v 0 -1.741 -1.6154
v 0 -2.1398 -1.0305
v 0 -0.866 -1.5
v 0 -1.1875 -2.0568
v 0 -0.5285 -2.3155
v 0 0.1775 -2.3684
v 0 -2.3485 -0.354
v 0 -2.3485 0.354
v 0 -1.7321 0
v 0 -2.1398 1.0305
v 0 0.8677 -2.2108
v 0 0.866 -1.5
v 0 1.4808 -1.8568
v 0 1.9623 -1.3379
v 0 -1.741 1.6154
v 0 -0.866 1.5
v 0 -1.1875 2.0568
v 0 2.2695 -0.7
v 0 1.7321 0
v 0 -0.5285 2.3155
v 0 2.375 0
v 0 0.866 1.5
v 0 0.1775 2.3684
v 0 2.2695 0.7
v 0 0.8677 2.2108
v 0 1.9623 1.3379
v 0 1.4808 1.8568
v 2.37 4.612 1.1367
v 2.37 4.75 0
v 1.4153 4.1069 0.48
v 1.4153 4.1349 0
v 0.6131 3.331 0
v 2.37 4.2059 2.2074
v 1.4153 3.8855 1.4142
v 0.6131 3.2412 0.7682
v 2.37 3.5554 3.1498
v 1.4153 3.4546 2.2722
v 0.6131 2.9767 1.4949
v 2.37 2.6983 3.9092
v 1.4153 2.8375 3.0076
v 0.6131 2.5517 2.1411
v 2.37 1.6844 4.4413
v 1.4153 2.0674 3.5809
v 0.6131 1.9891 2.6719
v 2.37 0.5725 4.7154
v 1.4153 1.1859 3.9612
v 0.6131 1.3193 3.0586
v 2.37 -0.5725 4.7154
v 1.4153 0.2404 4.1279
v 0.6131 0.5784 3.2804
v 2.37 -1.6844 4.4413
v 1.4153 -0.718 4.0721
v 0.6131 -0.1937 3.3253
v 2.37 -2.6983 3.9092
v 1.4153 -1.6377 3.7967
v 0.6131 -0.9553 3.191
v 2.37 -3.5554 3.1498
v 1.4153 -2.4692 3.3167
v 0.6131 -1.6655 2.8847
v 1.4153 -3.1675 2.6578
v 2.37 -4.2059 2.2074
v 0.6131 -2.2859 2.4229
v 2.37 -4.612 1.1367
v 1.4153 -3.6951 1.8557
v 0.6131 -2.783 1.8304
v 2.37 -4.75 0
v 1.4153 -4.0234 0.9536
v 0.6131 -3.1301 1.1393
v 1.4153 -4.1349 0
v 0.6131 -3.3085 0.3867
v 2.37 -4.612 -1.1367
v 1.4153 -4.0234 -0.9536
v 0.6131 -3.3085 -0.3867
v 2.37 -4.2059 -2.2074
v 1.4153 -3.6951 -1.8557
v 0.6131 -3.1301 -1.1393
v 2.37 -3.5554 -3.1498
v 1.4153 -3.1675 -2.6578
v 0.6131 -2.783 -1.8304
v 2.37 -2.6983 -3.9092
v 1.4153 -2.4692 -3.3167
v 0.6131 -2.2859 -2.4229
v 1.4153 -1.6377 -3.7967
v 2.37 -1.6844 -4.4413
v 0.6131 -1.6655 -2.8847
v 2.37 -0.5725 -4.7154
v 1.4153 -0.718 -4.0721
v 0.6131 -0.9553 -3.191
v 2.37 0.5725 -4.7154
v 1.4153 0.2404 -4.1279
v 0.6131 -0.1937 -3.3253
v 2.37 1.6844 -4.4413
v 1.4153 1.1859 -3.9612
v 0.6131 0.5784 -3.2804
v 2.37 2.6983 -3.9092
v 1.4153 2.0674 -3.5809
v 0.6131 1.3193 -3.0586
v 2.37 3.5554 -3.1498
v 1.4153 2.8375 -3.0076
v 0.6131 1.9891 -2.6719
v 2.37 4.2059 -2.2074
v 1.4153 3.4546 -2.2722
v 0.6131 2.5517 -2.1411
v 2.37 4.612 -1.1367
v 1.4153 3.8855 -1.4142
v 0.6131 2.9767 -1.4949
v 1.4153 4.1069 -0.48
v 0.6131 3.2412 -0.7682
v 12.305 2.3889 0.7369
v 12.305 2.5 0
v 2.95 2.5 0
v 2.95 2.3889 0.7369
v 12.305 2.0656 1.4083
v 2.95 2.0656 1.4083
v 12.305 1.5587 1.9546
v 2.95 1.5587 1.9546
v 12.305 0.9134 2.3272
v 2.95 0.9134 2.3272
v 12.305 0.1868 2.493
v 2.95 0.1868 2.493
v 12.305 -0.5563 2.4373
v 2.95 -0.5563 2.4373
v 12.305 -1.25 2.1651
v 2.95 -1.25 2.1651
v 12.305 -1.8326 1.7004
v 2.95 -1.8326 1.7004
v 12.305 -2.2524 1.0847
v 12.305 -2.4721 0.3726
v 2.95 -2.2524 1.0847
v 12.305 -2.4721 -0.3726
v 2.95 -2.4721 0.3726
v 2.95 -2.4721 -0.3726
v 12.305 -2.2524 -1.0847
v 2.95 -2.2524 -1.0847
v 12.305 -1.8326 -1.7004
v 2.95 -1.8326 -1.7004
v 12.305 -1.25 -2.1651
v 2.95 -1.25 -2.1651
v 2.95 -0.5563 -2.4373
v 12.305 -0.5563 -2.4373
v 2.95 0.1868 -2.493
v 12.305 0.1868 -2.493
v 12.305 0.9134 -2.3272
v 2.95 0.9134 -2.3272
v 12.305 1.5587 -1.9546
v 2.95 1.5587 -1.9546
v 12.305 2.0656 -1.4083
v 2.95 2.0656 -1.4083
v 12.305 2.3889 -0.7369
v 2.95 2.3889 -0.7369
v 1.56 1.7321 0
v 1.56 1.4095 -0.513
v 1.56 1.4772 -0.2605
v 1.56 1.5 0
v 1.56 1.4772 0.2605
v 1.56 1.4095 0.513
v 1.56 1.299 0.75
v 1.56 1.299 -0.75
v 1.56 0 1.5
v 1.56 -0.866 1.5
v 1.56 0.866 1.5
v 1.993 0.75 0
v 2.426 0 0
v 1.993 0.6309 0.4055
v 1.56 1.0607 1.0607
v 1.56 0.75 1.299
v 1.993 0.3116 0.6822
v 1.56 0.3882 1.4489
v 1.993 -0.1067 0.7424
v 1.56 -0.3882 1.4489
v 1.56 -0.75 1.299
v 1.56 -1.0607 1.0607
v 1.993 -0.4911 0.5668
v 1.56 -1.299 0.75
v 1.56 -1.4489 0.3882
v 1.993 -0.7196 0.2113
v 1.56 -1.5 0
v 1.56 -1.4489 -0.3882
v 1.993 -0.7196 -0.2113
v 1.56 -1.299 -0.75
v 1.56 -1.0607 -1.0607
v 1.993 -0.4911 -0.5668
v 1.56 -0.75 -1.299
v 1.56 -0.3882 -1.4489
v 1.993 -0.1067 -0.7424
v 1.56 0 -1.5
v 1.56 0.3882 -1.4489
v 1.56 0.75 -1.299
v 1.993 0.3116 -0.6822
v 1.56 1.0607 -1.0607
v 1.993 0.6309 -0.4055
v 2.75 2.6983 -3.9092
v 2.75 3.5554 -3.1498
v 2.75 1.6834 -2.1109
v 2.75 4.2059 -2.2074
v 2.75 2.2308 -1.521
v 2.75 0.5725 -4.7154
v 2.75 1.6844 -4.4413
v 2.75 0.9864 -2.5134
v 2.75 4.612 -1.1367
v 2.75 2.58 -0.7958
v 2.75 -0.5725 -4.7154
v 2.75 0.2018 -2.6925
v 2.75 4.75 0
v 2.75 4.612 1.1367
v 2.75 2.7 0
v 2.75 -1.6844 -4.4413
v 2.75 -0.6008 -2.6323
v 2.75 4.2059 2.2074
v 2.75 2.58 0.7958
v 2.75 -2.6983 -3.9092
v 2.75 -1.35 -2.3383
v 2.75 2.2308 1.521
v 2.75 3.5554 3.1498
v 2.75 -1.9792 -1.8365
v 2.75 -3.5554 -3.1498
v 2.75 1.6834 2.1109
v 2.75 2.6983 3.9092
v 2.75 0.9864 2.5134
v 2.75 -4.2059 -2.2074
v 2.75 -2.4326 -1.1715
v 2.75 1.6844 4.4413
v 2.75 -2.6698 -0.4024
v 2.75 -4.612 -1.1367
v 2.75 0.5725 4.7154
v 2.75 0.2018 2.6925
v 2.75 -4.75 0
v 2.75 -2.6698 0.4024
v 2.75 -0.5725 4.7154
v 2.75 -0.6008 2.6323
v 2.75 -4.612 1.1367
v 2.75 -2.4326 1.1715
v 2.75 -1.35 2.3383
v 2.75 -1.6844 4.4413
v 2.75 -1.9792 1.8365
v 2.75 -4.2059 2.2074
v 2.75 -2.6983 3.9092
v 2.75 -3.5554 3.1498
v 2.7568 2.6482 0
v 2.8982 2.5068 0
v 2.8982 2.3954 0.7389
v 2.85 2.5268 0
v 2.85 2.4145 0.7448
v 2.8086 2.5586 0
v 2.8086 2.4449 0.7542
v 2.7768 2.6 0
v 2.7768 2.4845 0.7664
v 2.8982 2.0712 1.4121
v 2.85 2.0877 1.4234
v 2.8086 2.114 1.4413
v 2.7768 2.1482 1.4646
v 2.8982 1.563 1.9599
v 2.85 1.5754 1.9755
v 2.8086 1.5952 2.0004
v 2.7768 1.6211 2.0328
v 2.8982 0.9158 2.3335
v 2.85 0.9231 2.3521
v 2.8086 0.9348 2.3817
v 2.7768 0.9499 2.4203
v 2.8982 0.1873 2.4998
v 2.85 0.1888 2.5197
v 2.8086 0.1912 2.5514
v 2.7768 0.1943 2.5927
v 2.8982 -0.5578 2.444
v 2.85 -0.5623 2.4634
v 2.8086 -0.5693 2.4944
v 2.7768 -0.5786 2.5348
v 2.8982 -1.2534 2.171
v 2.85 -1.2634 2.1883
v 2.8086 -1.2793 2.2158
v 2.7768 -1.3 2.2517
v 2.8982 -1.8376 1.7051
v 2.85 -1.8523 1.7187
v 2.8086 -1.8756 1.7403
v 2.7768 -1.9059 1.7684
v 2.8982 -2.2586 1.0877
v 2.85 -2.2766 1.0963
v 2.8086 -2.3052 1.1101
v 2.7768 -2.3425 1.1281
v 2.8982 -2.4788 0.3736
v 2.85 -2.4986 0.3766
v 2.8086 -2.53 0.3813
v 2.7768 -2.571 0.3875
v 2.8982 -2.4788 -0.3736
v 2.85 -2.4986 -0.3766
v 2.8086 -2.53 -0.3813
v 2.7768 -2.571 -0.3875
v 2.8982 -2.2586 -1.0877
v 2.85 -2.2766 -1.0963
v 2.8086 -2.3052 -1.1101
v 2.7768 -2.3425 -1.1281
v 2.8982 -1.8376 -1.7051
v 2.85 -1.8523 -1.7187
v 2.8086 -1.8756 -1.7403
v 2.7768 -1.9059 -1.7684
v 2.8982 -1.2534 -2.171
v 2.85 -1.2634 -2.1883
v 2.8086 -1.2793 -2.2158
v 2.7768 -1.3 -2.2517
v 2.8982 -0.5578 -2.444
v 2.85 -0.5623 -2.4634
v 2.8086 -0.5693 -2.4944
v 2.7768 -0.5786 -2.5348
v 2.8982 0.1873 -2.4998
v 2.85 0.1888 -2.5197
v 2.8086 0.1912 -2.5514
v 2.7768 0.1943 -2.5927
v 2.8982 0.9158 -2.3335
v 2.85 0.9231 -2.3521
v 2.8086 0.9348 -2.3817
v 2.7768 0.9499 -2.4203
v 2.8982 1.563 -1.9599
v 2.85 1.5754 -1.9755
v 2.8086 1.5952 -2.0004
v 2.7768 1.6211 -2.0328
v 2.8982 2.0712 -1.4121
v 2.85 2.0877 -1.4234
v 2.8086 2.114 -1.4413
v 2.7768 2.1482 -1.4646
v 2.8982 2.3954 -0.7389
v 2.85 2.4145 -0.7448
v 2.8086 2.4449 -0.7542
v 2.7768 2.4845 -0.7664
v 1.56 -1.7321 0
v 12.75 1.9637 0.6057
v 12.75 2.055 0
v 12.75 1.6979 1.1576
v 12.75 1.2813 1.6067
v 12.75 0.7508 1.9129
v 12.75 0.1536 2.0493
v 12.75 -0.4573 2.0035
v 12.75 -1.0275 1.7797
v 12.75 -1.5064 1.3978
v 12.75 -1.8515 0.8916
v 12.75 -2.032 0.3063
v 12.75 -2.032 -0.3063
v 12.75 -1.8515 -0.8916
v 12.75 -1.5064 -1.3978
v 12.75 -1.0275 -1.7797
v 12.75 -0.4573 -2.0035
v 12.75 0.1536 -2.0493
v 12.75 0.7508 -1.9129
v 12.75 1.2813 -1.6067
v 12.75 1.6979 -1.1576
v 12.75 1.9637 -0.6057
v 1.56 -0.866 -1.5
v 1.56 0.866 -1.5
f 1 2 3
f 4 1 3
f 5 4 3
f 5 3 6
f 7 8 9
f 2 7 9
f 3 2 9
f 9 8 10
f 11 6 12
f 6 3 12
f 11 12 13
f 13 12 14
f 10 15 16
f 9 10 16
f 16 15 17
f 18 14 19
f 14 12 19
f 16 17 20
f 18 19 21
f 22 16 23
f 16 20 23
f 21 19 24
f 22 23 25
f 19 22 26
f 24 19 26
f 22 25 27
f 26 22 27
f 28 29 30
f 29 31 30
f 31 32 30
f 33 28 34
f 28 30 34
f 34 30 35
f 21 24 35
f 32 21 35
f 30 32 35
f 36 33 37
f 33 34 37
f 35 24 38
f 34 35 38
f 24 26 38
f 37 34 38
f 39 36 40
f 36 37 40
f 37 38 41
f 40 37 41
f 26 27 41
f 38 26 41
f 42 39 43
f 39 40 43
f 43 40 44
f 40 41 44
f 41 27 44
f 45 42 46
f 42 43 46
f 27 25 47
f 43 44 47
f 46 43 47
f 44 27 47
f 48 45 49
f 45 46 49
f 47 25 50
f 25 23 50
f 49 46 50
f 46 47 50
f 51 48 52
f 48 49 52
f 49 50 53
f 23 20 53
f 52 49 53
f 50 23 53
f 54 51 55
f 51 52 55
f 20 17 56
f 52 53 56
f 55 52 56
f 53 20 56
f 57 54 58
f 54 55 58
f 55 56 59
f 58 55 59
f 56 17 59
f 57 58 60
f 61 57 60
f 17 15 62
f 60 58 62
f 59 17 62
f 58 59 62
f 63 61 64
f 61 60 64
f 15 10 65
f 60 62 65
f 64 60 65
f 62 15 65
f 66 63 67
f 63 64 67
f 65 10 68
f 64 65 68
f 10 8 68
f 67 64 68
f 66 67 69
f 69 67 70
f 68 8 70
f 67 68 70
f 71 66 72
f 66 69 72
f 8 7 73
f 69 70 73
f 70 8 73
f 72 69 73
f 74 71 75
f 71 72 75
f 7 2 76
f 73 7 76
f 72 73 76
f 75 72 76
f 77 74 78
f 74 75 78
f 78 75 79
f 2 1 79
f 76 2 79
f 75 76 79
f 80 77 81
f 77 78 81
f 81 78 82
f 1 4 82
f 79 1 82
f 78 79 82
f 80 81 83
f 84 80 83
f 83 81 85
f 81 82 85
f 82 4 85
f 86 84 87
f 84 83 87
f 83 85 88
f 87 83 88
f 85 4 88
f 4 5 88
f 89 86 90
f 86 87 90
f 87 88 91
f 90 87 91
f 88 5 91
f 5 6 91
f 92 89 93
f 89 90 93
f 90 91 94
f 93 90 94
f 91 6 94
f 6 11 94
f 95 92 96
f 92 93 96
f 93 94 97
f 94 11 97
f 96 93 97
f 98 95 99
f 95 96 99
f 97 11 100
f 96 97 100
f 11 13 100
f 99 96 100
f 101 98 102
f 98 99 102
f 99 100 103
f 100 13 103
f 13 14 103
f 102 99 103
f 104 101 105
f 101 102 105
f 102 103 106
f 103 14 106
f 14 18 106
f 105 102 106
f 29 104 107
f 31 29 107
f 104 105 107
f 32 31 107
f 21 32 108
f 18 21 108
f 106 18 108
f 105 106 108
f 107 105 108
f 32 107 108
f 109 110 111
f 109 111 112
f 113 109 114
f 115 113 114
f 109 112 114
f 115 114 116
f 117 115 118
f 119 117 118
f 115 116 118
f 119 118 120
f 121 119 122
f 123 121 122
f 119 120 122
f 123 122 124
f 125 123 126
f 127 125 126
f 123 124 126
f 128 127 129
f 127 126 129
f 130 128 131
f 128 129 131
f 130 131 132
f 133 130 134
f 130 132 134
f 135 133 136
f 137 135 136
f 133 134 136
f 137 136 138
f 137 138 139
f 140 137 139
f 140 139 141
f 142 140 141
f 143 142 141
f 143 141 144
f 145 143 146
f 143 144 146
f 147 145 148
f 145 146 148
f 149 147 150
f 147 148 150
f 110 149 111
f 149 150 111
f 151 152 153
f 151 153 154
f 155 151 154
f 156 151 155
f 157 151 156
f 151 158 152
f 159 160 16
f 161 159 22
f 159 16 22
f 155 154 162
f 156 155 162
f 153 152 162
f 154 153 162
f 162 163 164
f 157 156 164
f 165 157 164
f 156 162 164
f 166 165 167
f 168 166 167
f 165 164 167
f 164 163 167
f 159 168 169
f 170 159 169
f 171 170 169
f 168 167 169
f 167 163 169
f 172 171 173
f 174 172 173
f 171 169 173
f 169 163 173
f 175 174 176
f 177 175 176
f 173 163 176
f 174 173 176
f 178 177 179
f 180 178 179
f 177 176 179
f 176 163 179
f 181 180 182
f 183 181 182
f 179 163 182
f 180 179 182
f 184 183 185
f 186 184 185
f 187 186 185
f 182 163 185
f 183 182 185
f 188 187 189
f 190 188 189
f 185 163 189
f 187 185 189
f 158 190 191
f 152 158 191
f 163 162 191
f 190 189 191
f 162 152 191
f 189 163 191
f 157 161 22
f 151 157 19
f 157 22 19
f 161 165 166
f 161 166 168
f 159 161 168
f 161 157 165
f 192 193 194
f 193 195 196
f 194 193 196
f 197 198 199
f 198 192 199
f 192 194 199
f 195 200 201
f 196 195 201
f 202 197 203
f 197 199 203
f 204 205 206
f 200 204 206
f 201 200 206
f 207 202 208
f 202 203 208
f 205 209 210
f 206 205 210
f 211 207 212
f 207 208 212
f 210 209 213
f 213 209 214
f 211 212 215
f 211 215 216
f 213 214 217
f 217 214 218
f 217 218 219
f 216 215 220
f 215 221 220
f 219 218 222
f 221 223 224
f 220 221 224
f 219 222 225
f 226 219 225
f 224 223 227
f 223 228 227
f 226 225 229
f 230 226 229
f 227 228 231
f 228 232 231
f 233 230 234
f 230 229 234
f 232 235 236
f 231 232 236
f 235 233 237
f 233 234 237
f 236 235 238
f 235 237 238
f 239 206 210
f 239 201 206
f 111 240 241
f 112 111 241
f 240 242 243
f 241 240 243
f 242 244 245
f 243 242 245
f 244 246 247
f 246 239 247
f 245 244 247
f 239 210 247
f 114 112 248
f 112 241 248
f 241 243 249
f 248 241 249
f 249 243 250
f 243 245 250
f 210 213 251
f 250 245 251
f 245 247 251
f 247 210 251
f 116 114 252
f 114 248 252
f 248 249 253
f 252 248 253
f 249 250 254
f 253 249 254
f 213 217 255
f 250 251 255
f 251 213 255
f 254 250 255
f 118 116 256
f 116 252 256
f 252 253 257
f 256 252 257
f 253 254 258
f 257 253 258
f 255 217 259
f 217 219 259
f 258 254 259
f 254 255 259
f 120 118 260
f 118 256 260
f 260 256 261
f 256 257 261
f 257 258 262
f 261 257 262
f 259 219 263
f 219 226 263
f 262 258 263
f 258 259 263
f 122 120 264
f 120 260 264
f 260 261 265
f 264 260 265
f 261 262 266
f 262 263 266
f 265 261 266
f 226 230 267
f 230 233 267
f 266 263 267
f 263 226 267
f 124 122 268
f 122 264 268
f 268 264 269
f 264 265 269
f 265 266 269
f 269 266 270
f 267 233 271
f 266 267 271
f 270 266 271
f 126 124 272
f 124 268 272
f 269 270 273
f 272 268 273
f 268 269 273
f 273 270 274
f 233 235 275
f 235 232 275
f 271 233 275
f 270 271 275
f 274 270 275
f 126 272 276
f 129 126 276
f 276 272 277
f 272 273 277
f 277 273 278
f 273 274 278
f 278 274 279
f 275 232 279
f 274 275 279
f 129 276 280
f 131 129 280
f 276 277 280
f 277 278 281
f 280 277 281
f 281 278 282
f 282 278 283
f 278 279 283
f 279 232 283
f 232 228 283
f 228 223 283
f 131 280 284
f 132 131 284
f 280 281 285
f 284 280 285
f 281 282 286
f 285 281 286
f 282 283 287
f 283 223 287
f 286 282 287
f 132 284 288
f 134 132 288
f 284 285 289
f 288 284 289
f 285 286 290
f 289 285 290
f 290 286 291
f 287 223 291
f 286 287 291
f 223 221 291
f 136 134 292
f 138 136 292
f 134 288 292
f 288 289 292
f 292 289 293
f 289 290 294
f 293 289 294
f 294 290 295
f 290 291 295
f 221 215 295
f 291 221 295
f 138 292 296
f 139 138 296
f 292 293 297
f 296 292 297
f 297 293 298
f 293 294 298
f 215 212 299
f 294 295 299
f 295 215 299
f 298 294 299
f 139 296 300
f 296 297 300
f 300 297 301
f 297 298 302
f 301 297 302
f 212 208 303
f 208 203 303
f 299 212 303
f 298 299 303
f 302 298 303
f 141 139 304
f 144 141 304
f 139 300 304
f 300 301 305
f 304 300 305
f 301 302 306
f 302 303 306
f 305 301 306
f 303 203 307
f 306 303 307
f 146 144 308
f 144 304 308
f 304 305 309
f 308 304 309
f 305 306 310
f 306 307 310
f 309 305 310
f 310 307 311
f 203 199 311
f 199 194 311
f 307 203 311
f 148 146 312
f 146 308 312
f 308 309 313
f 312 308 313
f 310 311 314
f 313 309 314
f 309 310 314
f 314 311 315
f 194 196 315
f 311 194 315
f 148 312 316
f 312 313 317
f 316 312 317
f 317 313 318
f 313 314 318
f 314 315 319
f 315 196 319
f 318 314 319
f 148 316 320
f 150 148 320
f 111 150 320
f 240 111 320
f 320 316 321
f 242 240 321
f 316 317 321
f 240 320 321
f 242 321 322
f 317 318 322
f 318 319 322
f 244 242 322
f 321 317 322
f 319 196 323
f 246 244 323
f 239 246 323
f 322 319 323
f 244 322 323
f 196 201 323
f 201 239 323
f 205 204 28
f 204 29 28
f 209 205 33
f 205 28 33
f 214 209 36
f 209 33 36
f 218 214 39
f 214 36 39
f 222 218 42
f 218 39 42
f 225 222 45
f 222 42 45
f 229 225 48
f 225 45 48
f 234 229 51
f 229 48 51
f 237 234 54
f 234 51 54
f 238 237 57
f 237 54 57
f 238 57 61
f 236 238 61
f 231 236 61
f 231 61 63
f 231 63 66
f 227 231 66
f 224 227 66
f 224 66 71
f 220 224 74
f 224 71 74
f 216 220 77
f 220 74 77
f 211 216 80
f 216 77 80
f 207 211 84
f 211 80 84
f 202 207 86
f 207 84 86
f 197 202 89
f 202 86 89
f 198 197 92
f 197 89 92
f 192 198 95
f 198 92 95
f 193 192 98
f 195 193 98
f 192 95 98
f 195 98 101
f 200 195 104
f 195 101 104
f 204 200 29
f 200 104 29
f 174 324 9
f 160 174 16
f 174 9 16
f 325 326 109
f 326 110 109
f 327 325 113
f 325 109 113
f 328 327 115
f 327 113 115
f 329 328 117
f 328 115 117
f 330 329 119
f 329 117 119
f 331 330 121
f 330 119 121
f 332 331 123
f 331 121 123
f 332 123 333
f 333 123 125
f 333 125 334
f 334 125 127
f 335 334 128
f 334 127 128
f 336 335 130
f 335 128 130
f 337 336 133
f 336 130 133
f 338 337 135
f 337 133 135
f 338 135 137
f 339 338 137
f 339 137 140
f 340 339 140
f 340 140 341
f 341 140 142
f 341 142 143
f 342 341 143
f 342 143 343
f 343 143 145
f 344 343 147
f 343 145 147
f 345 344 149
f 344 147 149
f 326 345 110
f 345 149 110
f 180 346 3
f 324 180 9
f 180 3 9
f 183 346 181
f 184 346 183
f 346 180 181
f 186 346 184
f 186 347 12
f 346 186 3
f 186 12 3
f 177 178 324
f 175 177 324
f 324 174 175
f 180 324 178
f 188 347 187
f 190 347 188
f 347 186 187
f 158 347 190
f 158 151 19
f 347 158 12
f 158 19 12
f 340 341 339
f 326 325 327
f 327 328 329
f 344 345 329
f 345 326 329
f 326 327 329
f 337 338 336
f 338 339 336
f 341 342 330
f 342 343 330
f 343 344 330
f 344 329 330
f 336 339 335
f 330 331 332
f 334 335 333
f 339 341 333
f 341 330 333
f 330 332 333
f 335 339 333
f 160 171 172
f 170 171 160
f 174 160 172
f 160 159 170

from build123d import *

# Parameters (mm, degrees)
FILLET1_R   = 0.2
HEX_2_DEPTH = 1.56


with BuildPart() as part:
    # BodySke → BaseBody (revolve)
    with BuildSketch(Plane.XY):
        with BuildLine():
            Line((12.75, 0), (12.75, 2.055))
            Line((12.75, 2.055), (12.305, 2.5))
            Line((12.305, 2.5), (2.75, 2.5))
            Line((2.75, 2.5), (2.75, 4.75))
            Line((2.75, 4.75), (2.37, 4.75))
            ThreePointArc((2.37, 4.75), (0.992680215, 3.754414901), (0, 2.375))
            Line((0, 2.375), (0, 0))
            Line((0, 0), (12.75, 0))
        make_face()
    revolve(axis=Axis((0, 0, 0), (1, 0, 0)))

    # Fillet1
    fillet1_edges = [part.edges().sort_by_distance(p)[0] for p in [
        (2.75, -2.5, 0),
    ]]
    fillet(fillet1_edges, radius=FILLET1_R)

    # Sketch2 → PreBroach (revolve, cut)
    with BuildSketch(Plane.XY):
        Polygon((0, 1.5), (1.56, 1.5), (2.426025404, 0), (0, 0), align=None)
    revolve(axis=Axis((0, 0, 0), (1, 0, 0)), mode=Mode.SUBTRACT)

    # Sketch3 → Hex 2 (cut)
    with BuildSketch(Plane(origin=(0, 0, 0), x_dir=(0, 0, -1), z_dir=(1, 0, 0))):
        Polygon((-1.5, -0.866025404), (-1.5, 0.866025404), (0, 1.732050808), (1.5, 0.866025404), (1.5, -0.866025404), (0, -1.732050808), align=None)
    extrude(amount=HEX_2_DEPTH, mode=Mode.SUBTRACT)


solid = part.part
